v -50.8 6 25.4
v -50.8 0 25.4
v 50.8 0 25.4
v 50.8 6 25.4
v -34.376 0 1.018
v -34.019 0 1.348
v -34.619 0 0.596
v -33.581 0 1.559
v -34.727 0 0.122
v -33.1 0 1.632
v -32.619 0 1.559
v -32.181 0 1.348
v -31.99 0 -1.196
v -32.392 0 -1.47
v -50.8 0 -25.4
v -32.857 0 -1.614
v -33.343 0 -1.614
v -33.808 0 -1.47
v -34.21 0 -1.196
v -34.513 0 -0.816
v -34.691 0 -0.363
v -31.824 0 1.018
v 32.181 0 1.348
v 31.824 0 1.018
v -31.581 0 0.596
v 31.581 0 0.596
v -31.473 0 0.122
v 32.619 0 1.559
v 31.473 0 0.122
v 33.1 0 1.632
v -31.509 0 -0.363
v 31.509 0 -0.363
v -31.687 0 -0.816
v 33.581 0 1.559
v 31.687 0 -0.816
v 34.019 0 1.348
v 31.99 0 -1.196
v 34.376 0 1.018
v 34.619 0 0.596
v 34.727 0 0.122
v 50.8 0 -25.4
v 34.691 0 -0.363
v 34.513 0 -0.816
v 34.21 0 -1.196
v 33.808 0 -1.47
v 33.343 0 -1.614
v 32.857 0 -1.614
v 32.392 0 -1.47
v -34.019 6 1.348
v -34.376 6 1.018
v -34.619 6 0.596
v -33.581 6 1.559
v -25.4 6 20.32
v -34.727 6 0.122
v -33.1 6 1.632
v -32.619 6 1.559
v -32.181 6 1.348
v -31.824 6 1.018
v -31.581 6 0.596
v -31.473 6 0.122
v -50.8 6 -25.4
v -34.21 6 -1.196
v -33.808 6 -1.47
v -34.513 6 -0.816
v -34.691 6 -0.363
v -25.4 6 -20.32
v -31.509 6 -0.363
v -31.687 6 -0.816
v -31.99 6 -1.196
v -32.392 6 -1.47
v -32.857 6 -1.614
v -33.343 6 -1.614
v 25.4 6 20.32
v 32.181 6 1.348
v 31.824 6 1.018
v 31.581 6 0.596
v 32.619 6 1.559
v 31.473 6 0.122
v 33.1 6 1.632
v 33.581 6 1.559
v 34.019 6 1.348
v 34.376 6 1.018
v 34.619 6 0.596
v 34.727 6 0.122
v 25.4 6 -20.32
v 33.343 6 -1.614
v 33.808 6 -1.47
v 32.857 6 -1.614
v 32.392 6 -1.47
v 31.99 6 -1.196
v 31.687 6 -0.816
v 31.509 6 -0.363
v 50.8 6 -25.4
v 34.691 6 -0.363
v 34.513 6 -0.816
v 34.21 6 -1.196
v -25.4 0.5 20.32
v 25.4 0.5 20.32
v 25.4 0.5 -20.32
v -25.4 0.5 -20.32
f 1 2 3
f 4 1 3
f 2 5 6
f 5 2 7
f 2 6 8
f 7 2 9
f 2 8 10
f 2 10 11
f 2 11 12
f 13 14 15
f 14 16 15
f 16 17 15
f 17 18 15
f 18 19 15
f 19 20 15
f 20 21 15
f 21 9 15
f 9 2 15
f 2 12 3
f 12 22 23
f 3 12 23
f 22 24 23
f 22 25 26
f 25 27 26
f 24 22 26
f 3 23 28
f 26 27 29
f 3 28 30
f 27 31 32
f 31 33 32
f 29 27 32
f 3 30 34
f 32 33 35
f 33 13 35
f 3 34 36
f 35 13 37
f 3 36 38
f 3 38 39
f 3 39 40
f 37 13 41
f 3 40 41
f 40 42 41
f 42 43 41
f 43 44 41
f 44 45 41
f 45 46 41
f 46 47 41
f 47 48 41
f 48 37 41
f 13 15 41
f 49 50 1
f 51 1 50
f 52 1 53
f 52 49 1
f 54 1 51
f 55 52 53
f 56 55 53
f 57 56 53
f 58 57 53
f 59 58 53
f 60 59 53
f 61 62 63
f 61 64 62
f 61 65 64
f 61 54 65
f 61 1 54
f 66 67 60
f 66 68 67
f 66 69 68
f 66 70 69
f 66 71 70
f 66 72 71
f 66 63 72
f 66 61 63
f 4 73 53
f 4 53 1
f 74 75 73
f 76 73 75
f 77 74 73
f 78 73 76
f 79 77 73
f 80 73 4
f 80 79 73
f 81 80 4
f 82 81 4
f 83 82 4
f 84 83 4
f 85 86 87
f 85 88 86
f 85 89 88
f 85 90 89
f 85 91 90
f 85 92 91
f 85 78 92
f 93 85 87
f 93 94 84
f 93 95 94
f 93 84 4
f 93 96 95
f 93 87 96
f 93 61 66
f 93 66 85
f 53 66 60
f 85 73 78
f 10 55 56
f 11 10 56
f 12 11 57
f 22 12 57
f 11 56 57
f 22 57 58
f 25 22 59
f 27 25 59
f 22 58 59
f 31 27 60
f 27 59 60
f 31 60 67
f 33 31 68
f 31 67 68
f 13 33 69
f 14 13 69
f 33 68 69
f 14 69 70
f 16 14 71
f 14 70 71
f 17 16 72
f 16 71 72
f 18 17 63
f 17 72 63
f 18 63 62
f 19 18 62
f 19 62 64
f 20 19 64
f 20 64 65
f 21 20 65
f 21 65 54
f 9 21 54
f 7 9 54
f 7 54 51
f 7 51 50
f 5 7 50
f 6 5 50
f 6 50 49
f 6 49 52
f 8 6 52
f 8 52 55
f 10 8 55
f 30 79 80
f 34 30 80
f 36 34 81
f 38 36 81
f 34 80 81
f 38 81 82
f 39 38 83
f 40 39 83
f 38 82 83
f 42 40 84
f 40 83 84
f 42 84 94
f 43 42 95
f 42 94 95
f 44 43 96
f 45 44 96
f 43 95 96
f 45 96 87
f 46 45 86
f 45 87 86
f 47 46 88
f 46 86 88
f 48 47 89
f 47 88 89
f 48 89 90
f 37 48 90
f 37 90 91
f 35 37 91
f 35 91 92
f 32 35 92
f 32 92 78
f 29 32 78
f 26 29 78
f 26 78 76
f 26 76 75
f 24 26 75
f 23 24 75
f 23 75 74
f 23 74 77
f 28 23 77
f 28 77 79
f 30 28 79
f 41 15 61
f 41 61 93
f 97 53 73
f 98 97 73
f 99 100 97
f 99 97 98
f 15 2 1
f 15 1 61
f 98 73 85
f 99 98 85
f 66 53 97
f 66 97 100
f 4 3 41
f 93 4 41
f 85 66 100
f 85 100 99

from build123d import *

# Parameters (mm, degrees)
SKETCH1_W           = 101.6
SKETCH1_H           = 50.8
BOSS_EXTRUDE1_DEPTH = 6
SKETCH2_W           = 50.8
SKETCH2_H           = 40.64
CUT_EXTRUDE1_DEPTH  = 5.5
SKETCH3_R           = 1.63195
CUT_EXTRUDE2_DEPTH  = 58.112170332
SKETCH4_R           = 1.63195
CUT_EXTRUDE3_DEPTH  = 58.112170332


with BuildPart() as part:
    # Sketch1 → Boss-Extrude1 (new body)
    with BuildSketch(Plane(origin=(0, 0, 0), x_dir=(1, 0, 0), z_dir=(0, 1, 0))):
        Rectangle(SKETCH1_W, SKETCH1_H)
    extrude(amount=BOSS_EXTRUDE1_DEPTH)

    # Sketch2 → Cut-Extrude1 (cut)
    with BuildSketch(Plane(origin=(0, 6, 0), x_dir=(1, 0, 0), z_dir=(0, 1, 0))):
        Rectangle(SKETCH2_W, SKETCH2_H)
    extrude(amount=-CUT_EXTRUDE1_DEPTH, mode=Mode.SUBTRACT)

    # Sketch3 → Cut-Extrude2 (cut, through all)
    with BuildSketch(Plane(origin=(0, 6, 0), x_dir=(1, 0, 0), z_dir=(0, 1, 0))):
        with Locations(Location((-33.1, 0, 0), (0, 0, 270))):
            Circle(SKETCH3_R)
    extrude(amount=-CUT_EXTRUDE2_DEPTH, mode=Mode.SUBTRACT)

    # Sketch4 → Cut-Extrude3 (cut, through all)
    with BuildSketch(Plane(origin=(0, 6, 0), x_dir=(1, 0, 0), z_dir=(0, 1, 0))):
        with Locations(Location((33.1, 0, 0), (0, 0, 270))):
            Circle(SKETCH4_R)
    extrude(amount=-CUT_EXTRUDE3_DEPTH, mode=Mode.SUBTRACT)


solid = part.part
